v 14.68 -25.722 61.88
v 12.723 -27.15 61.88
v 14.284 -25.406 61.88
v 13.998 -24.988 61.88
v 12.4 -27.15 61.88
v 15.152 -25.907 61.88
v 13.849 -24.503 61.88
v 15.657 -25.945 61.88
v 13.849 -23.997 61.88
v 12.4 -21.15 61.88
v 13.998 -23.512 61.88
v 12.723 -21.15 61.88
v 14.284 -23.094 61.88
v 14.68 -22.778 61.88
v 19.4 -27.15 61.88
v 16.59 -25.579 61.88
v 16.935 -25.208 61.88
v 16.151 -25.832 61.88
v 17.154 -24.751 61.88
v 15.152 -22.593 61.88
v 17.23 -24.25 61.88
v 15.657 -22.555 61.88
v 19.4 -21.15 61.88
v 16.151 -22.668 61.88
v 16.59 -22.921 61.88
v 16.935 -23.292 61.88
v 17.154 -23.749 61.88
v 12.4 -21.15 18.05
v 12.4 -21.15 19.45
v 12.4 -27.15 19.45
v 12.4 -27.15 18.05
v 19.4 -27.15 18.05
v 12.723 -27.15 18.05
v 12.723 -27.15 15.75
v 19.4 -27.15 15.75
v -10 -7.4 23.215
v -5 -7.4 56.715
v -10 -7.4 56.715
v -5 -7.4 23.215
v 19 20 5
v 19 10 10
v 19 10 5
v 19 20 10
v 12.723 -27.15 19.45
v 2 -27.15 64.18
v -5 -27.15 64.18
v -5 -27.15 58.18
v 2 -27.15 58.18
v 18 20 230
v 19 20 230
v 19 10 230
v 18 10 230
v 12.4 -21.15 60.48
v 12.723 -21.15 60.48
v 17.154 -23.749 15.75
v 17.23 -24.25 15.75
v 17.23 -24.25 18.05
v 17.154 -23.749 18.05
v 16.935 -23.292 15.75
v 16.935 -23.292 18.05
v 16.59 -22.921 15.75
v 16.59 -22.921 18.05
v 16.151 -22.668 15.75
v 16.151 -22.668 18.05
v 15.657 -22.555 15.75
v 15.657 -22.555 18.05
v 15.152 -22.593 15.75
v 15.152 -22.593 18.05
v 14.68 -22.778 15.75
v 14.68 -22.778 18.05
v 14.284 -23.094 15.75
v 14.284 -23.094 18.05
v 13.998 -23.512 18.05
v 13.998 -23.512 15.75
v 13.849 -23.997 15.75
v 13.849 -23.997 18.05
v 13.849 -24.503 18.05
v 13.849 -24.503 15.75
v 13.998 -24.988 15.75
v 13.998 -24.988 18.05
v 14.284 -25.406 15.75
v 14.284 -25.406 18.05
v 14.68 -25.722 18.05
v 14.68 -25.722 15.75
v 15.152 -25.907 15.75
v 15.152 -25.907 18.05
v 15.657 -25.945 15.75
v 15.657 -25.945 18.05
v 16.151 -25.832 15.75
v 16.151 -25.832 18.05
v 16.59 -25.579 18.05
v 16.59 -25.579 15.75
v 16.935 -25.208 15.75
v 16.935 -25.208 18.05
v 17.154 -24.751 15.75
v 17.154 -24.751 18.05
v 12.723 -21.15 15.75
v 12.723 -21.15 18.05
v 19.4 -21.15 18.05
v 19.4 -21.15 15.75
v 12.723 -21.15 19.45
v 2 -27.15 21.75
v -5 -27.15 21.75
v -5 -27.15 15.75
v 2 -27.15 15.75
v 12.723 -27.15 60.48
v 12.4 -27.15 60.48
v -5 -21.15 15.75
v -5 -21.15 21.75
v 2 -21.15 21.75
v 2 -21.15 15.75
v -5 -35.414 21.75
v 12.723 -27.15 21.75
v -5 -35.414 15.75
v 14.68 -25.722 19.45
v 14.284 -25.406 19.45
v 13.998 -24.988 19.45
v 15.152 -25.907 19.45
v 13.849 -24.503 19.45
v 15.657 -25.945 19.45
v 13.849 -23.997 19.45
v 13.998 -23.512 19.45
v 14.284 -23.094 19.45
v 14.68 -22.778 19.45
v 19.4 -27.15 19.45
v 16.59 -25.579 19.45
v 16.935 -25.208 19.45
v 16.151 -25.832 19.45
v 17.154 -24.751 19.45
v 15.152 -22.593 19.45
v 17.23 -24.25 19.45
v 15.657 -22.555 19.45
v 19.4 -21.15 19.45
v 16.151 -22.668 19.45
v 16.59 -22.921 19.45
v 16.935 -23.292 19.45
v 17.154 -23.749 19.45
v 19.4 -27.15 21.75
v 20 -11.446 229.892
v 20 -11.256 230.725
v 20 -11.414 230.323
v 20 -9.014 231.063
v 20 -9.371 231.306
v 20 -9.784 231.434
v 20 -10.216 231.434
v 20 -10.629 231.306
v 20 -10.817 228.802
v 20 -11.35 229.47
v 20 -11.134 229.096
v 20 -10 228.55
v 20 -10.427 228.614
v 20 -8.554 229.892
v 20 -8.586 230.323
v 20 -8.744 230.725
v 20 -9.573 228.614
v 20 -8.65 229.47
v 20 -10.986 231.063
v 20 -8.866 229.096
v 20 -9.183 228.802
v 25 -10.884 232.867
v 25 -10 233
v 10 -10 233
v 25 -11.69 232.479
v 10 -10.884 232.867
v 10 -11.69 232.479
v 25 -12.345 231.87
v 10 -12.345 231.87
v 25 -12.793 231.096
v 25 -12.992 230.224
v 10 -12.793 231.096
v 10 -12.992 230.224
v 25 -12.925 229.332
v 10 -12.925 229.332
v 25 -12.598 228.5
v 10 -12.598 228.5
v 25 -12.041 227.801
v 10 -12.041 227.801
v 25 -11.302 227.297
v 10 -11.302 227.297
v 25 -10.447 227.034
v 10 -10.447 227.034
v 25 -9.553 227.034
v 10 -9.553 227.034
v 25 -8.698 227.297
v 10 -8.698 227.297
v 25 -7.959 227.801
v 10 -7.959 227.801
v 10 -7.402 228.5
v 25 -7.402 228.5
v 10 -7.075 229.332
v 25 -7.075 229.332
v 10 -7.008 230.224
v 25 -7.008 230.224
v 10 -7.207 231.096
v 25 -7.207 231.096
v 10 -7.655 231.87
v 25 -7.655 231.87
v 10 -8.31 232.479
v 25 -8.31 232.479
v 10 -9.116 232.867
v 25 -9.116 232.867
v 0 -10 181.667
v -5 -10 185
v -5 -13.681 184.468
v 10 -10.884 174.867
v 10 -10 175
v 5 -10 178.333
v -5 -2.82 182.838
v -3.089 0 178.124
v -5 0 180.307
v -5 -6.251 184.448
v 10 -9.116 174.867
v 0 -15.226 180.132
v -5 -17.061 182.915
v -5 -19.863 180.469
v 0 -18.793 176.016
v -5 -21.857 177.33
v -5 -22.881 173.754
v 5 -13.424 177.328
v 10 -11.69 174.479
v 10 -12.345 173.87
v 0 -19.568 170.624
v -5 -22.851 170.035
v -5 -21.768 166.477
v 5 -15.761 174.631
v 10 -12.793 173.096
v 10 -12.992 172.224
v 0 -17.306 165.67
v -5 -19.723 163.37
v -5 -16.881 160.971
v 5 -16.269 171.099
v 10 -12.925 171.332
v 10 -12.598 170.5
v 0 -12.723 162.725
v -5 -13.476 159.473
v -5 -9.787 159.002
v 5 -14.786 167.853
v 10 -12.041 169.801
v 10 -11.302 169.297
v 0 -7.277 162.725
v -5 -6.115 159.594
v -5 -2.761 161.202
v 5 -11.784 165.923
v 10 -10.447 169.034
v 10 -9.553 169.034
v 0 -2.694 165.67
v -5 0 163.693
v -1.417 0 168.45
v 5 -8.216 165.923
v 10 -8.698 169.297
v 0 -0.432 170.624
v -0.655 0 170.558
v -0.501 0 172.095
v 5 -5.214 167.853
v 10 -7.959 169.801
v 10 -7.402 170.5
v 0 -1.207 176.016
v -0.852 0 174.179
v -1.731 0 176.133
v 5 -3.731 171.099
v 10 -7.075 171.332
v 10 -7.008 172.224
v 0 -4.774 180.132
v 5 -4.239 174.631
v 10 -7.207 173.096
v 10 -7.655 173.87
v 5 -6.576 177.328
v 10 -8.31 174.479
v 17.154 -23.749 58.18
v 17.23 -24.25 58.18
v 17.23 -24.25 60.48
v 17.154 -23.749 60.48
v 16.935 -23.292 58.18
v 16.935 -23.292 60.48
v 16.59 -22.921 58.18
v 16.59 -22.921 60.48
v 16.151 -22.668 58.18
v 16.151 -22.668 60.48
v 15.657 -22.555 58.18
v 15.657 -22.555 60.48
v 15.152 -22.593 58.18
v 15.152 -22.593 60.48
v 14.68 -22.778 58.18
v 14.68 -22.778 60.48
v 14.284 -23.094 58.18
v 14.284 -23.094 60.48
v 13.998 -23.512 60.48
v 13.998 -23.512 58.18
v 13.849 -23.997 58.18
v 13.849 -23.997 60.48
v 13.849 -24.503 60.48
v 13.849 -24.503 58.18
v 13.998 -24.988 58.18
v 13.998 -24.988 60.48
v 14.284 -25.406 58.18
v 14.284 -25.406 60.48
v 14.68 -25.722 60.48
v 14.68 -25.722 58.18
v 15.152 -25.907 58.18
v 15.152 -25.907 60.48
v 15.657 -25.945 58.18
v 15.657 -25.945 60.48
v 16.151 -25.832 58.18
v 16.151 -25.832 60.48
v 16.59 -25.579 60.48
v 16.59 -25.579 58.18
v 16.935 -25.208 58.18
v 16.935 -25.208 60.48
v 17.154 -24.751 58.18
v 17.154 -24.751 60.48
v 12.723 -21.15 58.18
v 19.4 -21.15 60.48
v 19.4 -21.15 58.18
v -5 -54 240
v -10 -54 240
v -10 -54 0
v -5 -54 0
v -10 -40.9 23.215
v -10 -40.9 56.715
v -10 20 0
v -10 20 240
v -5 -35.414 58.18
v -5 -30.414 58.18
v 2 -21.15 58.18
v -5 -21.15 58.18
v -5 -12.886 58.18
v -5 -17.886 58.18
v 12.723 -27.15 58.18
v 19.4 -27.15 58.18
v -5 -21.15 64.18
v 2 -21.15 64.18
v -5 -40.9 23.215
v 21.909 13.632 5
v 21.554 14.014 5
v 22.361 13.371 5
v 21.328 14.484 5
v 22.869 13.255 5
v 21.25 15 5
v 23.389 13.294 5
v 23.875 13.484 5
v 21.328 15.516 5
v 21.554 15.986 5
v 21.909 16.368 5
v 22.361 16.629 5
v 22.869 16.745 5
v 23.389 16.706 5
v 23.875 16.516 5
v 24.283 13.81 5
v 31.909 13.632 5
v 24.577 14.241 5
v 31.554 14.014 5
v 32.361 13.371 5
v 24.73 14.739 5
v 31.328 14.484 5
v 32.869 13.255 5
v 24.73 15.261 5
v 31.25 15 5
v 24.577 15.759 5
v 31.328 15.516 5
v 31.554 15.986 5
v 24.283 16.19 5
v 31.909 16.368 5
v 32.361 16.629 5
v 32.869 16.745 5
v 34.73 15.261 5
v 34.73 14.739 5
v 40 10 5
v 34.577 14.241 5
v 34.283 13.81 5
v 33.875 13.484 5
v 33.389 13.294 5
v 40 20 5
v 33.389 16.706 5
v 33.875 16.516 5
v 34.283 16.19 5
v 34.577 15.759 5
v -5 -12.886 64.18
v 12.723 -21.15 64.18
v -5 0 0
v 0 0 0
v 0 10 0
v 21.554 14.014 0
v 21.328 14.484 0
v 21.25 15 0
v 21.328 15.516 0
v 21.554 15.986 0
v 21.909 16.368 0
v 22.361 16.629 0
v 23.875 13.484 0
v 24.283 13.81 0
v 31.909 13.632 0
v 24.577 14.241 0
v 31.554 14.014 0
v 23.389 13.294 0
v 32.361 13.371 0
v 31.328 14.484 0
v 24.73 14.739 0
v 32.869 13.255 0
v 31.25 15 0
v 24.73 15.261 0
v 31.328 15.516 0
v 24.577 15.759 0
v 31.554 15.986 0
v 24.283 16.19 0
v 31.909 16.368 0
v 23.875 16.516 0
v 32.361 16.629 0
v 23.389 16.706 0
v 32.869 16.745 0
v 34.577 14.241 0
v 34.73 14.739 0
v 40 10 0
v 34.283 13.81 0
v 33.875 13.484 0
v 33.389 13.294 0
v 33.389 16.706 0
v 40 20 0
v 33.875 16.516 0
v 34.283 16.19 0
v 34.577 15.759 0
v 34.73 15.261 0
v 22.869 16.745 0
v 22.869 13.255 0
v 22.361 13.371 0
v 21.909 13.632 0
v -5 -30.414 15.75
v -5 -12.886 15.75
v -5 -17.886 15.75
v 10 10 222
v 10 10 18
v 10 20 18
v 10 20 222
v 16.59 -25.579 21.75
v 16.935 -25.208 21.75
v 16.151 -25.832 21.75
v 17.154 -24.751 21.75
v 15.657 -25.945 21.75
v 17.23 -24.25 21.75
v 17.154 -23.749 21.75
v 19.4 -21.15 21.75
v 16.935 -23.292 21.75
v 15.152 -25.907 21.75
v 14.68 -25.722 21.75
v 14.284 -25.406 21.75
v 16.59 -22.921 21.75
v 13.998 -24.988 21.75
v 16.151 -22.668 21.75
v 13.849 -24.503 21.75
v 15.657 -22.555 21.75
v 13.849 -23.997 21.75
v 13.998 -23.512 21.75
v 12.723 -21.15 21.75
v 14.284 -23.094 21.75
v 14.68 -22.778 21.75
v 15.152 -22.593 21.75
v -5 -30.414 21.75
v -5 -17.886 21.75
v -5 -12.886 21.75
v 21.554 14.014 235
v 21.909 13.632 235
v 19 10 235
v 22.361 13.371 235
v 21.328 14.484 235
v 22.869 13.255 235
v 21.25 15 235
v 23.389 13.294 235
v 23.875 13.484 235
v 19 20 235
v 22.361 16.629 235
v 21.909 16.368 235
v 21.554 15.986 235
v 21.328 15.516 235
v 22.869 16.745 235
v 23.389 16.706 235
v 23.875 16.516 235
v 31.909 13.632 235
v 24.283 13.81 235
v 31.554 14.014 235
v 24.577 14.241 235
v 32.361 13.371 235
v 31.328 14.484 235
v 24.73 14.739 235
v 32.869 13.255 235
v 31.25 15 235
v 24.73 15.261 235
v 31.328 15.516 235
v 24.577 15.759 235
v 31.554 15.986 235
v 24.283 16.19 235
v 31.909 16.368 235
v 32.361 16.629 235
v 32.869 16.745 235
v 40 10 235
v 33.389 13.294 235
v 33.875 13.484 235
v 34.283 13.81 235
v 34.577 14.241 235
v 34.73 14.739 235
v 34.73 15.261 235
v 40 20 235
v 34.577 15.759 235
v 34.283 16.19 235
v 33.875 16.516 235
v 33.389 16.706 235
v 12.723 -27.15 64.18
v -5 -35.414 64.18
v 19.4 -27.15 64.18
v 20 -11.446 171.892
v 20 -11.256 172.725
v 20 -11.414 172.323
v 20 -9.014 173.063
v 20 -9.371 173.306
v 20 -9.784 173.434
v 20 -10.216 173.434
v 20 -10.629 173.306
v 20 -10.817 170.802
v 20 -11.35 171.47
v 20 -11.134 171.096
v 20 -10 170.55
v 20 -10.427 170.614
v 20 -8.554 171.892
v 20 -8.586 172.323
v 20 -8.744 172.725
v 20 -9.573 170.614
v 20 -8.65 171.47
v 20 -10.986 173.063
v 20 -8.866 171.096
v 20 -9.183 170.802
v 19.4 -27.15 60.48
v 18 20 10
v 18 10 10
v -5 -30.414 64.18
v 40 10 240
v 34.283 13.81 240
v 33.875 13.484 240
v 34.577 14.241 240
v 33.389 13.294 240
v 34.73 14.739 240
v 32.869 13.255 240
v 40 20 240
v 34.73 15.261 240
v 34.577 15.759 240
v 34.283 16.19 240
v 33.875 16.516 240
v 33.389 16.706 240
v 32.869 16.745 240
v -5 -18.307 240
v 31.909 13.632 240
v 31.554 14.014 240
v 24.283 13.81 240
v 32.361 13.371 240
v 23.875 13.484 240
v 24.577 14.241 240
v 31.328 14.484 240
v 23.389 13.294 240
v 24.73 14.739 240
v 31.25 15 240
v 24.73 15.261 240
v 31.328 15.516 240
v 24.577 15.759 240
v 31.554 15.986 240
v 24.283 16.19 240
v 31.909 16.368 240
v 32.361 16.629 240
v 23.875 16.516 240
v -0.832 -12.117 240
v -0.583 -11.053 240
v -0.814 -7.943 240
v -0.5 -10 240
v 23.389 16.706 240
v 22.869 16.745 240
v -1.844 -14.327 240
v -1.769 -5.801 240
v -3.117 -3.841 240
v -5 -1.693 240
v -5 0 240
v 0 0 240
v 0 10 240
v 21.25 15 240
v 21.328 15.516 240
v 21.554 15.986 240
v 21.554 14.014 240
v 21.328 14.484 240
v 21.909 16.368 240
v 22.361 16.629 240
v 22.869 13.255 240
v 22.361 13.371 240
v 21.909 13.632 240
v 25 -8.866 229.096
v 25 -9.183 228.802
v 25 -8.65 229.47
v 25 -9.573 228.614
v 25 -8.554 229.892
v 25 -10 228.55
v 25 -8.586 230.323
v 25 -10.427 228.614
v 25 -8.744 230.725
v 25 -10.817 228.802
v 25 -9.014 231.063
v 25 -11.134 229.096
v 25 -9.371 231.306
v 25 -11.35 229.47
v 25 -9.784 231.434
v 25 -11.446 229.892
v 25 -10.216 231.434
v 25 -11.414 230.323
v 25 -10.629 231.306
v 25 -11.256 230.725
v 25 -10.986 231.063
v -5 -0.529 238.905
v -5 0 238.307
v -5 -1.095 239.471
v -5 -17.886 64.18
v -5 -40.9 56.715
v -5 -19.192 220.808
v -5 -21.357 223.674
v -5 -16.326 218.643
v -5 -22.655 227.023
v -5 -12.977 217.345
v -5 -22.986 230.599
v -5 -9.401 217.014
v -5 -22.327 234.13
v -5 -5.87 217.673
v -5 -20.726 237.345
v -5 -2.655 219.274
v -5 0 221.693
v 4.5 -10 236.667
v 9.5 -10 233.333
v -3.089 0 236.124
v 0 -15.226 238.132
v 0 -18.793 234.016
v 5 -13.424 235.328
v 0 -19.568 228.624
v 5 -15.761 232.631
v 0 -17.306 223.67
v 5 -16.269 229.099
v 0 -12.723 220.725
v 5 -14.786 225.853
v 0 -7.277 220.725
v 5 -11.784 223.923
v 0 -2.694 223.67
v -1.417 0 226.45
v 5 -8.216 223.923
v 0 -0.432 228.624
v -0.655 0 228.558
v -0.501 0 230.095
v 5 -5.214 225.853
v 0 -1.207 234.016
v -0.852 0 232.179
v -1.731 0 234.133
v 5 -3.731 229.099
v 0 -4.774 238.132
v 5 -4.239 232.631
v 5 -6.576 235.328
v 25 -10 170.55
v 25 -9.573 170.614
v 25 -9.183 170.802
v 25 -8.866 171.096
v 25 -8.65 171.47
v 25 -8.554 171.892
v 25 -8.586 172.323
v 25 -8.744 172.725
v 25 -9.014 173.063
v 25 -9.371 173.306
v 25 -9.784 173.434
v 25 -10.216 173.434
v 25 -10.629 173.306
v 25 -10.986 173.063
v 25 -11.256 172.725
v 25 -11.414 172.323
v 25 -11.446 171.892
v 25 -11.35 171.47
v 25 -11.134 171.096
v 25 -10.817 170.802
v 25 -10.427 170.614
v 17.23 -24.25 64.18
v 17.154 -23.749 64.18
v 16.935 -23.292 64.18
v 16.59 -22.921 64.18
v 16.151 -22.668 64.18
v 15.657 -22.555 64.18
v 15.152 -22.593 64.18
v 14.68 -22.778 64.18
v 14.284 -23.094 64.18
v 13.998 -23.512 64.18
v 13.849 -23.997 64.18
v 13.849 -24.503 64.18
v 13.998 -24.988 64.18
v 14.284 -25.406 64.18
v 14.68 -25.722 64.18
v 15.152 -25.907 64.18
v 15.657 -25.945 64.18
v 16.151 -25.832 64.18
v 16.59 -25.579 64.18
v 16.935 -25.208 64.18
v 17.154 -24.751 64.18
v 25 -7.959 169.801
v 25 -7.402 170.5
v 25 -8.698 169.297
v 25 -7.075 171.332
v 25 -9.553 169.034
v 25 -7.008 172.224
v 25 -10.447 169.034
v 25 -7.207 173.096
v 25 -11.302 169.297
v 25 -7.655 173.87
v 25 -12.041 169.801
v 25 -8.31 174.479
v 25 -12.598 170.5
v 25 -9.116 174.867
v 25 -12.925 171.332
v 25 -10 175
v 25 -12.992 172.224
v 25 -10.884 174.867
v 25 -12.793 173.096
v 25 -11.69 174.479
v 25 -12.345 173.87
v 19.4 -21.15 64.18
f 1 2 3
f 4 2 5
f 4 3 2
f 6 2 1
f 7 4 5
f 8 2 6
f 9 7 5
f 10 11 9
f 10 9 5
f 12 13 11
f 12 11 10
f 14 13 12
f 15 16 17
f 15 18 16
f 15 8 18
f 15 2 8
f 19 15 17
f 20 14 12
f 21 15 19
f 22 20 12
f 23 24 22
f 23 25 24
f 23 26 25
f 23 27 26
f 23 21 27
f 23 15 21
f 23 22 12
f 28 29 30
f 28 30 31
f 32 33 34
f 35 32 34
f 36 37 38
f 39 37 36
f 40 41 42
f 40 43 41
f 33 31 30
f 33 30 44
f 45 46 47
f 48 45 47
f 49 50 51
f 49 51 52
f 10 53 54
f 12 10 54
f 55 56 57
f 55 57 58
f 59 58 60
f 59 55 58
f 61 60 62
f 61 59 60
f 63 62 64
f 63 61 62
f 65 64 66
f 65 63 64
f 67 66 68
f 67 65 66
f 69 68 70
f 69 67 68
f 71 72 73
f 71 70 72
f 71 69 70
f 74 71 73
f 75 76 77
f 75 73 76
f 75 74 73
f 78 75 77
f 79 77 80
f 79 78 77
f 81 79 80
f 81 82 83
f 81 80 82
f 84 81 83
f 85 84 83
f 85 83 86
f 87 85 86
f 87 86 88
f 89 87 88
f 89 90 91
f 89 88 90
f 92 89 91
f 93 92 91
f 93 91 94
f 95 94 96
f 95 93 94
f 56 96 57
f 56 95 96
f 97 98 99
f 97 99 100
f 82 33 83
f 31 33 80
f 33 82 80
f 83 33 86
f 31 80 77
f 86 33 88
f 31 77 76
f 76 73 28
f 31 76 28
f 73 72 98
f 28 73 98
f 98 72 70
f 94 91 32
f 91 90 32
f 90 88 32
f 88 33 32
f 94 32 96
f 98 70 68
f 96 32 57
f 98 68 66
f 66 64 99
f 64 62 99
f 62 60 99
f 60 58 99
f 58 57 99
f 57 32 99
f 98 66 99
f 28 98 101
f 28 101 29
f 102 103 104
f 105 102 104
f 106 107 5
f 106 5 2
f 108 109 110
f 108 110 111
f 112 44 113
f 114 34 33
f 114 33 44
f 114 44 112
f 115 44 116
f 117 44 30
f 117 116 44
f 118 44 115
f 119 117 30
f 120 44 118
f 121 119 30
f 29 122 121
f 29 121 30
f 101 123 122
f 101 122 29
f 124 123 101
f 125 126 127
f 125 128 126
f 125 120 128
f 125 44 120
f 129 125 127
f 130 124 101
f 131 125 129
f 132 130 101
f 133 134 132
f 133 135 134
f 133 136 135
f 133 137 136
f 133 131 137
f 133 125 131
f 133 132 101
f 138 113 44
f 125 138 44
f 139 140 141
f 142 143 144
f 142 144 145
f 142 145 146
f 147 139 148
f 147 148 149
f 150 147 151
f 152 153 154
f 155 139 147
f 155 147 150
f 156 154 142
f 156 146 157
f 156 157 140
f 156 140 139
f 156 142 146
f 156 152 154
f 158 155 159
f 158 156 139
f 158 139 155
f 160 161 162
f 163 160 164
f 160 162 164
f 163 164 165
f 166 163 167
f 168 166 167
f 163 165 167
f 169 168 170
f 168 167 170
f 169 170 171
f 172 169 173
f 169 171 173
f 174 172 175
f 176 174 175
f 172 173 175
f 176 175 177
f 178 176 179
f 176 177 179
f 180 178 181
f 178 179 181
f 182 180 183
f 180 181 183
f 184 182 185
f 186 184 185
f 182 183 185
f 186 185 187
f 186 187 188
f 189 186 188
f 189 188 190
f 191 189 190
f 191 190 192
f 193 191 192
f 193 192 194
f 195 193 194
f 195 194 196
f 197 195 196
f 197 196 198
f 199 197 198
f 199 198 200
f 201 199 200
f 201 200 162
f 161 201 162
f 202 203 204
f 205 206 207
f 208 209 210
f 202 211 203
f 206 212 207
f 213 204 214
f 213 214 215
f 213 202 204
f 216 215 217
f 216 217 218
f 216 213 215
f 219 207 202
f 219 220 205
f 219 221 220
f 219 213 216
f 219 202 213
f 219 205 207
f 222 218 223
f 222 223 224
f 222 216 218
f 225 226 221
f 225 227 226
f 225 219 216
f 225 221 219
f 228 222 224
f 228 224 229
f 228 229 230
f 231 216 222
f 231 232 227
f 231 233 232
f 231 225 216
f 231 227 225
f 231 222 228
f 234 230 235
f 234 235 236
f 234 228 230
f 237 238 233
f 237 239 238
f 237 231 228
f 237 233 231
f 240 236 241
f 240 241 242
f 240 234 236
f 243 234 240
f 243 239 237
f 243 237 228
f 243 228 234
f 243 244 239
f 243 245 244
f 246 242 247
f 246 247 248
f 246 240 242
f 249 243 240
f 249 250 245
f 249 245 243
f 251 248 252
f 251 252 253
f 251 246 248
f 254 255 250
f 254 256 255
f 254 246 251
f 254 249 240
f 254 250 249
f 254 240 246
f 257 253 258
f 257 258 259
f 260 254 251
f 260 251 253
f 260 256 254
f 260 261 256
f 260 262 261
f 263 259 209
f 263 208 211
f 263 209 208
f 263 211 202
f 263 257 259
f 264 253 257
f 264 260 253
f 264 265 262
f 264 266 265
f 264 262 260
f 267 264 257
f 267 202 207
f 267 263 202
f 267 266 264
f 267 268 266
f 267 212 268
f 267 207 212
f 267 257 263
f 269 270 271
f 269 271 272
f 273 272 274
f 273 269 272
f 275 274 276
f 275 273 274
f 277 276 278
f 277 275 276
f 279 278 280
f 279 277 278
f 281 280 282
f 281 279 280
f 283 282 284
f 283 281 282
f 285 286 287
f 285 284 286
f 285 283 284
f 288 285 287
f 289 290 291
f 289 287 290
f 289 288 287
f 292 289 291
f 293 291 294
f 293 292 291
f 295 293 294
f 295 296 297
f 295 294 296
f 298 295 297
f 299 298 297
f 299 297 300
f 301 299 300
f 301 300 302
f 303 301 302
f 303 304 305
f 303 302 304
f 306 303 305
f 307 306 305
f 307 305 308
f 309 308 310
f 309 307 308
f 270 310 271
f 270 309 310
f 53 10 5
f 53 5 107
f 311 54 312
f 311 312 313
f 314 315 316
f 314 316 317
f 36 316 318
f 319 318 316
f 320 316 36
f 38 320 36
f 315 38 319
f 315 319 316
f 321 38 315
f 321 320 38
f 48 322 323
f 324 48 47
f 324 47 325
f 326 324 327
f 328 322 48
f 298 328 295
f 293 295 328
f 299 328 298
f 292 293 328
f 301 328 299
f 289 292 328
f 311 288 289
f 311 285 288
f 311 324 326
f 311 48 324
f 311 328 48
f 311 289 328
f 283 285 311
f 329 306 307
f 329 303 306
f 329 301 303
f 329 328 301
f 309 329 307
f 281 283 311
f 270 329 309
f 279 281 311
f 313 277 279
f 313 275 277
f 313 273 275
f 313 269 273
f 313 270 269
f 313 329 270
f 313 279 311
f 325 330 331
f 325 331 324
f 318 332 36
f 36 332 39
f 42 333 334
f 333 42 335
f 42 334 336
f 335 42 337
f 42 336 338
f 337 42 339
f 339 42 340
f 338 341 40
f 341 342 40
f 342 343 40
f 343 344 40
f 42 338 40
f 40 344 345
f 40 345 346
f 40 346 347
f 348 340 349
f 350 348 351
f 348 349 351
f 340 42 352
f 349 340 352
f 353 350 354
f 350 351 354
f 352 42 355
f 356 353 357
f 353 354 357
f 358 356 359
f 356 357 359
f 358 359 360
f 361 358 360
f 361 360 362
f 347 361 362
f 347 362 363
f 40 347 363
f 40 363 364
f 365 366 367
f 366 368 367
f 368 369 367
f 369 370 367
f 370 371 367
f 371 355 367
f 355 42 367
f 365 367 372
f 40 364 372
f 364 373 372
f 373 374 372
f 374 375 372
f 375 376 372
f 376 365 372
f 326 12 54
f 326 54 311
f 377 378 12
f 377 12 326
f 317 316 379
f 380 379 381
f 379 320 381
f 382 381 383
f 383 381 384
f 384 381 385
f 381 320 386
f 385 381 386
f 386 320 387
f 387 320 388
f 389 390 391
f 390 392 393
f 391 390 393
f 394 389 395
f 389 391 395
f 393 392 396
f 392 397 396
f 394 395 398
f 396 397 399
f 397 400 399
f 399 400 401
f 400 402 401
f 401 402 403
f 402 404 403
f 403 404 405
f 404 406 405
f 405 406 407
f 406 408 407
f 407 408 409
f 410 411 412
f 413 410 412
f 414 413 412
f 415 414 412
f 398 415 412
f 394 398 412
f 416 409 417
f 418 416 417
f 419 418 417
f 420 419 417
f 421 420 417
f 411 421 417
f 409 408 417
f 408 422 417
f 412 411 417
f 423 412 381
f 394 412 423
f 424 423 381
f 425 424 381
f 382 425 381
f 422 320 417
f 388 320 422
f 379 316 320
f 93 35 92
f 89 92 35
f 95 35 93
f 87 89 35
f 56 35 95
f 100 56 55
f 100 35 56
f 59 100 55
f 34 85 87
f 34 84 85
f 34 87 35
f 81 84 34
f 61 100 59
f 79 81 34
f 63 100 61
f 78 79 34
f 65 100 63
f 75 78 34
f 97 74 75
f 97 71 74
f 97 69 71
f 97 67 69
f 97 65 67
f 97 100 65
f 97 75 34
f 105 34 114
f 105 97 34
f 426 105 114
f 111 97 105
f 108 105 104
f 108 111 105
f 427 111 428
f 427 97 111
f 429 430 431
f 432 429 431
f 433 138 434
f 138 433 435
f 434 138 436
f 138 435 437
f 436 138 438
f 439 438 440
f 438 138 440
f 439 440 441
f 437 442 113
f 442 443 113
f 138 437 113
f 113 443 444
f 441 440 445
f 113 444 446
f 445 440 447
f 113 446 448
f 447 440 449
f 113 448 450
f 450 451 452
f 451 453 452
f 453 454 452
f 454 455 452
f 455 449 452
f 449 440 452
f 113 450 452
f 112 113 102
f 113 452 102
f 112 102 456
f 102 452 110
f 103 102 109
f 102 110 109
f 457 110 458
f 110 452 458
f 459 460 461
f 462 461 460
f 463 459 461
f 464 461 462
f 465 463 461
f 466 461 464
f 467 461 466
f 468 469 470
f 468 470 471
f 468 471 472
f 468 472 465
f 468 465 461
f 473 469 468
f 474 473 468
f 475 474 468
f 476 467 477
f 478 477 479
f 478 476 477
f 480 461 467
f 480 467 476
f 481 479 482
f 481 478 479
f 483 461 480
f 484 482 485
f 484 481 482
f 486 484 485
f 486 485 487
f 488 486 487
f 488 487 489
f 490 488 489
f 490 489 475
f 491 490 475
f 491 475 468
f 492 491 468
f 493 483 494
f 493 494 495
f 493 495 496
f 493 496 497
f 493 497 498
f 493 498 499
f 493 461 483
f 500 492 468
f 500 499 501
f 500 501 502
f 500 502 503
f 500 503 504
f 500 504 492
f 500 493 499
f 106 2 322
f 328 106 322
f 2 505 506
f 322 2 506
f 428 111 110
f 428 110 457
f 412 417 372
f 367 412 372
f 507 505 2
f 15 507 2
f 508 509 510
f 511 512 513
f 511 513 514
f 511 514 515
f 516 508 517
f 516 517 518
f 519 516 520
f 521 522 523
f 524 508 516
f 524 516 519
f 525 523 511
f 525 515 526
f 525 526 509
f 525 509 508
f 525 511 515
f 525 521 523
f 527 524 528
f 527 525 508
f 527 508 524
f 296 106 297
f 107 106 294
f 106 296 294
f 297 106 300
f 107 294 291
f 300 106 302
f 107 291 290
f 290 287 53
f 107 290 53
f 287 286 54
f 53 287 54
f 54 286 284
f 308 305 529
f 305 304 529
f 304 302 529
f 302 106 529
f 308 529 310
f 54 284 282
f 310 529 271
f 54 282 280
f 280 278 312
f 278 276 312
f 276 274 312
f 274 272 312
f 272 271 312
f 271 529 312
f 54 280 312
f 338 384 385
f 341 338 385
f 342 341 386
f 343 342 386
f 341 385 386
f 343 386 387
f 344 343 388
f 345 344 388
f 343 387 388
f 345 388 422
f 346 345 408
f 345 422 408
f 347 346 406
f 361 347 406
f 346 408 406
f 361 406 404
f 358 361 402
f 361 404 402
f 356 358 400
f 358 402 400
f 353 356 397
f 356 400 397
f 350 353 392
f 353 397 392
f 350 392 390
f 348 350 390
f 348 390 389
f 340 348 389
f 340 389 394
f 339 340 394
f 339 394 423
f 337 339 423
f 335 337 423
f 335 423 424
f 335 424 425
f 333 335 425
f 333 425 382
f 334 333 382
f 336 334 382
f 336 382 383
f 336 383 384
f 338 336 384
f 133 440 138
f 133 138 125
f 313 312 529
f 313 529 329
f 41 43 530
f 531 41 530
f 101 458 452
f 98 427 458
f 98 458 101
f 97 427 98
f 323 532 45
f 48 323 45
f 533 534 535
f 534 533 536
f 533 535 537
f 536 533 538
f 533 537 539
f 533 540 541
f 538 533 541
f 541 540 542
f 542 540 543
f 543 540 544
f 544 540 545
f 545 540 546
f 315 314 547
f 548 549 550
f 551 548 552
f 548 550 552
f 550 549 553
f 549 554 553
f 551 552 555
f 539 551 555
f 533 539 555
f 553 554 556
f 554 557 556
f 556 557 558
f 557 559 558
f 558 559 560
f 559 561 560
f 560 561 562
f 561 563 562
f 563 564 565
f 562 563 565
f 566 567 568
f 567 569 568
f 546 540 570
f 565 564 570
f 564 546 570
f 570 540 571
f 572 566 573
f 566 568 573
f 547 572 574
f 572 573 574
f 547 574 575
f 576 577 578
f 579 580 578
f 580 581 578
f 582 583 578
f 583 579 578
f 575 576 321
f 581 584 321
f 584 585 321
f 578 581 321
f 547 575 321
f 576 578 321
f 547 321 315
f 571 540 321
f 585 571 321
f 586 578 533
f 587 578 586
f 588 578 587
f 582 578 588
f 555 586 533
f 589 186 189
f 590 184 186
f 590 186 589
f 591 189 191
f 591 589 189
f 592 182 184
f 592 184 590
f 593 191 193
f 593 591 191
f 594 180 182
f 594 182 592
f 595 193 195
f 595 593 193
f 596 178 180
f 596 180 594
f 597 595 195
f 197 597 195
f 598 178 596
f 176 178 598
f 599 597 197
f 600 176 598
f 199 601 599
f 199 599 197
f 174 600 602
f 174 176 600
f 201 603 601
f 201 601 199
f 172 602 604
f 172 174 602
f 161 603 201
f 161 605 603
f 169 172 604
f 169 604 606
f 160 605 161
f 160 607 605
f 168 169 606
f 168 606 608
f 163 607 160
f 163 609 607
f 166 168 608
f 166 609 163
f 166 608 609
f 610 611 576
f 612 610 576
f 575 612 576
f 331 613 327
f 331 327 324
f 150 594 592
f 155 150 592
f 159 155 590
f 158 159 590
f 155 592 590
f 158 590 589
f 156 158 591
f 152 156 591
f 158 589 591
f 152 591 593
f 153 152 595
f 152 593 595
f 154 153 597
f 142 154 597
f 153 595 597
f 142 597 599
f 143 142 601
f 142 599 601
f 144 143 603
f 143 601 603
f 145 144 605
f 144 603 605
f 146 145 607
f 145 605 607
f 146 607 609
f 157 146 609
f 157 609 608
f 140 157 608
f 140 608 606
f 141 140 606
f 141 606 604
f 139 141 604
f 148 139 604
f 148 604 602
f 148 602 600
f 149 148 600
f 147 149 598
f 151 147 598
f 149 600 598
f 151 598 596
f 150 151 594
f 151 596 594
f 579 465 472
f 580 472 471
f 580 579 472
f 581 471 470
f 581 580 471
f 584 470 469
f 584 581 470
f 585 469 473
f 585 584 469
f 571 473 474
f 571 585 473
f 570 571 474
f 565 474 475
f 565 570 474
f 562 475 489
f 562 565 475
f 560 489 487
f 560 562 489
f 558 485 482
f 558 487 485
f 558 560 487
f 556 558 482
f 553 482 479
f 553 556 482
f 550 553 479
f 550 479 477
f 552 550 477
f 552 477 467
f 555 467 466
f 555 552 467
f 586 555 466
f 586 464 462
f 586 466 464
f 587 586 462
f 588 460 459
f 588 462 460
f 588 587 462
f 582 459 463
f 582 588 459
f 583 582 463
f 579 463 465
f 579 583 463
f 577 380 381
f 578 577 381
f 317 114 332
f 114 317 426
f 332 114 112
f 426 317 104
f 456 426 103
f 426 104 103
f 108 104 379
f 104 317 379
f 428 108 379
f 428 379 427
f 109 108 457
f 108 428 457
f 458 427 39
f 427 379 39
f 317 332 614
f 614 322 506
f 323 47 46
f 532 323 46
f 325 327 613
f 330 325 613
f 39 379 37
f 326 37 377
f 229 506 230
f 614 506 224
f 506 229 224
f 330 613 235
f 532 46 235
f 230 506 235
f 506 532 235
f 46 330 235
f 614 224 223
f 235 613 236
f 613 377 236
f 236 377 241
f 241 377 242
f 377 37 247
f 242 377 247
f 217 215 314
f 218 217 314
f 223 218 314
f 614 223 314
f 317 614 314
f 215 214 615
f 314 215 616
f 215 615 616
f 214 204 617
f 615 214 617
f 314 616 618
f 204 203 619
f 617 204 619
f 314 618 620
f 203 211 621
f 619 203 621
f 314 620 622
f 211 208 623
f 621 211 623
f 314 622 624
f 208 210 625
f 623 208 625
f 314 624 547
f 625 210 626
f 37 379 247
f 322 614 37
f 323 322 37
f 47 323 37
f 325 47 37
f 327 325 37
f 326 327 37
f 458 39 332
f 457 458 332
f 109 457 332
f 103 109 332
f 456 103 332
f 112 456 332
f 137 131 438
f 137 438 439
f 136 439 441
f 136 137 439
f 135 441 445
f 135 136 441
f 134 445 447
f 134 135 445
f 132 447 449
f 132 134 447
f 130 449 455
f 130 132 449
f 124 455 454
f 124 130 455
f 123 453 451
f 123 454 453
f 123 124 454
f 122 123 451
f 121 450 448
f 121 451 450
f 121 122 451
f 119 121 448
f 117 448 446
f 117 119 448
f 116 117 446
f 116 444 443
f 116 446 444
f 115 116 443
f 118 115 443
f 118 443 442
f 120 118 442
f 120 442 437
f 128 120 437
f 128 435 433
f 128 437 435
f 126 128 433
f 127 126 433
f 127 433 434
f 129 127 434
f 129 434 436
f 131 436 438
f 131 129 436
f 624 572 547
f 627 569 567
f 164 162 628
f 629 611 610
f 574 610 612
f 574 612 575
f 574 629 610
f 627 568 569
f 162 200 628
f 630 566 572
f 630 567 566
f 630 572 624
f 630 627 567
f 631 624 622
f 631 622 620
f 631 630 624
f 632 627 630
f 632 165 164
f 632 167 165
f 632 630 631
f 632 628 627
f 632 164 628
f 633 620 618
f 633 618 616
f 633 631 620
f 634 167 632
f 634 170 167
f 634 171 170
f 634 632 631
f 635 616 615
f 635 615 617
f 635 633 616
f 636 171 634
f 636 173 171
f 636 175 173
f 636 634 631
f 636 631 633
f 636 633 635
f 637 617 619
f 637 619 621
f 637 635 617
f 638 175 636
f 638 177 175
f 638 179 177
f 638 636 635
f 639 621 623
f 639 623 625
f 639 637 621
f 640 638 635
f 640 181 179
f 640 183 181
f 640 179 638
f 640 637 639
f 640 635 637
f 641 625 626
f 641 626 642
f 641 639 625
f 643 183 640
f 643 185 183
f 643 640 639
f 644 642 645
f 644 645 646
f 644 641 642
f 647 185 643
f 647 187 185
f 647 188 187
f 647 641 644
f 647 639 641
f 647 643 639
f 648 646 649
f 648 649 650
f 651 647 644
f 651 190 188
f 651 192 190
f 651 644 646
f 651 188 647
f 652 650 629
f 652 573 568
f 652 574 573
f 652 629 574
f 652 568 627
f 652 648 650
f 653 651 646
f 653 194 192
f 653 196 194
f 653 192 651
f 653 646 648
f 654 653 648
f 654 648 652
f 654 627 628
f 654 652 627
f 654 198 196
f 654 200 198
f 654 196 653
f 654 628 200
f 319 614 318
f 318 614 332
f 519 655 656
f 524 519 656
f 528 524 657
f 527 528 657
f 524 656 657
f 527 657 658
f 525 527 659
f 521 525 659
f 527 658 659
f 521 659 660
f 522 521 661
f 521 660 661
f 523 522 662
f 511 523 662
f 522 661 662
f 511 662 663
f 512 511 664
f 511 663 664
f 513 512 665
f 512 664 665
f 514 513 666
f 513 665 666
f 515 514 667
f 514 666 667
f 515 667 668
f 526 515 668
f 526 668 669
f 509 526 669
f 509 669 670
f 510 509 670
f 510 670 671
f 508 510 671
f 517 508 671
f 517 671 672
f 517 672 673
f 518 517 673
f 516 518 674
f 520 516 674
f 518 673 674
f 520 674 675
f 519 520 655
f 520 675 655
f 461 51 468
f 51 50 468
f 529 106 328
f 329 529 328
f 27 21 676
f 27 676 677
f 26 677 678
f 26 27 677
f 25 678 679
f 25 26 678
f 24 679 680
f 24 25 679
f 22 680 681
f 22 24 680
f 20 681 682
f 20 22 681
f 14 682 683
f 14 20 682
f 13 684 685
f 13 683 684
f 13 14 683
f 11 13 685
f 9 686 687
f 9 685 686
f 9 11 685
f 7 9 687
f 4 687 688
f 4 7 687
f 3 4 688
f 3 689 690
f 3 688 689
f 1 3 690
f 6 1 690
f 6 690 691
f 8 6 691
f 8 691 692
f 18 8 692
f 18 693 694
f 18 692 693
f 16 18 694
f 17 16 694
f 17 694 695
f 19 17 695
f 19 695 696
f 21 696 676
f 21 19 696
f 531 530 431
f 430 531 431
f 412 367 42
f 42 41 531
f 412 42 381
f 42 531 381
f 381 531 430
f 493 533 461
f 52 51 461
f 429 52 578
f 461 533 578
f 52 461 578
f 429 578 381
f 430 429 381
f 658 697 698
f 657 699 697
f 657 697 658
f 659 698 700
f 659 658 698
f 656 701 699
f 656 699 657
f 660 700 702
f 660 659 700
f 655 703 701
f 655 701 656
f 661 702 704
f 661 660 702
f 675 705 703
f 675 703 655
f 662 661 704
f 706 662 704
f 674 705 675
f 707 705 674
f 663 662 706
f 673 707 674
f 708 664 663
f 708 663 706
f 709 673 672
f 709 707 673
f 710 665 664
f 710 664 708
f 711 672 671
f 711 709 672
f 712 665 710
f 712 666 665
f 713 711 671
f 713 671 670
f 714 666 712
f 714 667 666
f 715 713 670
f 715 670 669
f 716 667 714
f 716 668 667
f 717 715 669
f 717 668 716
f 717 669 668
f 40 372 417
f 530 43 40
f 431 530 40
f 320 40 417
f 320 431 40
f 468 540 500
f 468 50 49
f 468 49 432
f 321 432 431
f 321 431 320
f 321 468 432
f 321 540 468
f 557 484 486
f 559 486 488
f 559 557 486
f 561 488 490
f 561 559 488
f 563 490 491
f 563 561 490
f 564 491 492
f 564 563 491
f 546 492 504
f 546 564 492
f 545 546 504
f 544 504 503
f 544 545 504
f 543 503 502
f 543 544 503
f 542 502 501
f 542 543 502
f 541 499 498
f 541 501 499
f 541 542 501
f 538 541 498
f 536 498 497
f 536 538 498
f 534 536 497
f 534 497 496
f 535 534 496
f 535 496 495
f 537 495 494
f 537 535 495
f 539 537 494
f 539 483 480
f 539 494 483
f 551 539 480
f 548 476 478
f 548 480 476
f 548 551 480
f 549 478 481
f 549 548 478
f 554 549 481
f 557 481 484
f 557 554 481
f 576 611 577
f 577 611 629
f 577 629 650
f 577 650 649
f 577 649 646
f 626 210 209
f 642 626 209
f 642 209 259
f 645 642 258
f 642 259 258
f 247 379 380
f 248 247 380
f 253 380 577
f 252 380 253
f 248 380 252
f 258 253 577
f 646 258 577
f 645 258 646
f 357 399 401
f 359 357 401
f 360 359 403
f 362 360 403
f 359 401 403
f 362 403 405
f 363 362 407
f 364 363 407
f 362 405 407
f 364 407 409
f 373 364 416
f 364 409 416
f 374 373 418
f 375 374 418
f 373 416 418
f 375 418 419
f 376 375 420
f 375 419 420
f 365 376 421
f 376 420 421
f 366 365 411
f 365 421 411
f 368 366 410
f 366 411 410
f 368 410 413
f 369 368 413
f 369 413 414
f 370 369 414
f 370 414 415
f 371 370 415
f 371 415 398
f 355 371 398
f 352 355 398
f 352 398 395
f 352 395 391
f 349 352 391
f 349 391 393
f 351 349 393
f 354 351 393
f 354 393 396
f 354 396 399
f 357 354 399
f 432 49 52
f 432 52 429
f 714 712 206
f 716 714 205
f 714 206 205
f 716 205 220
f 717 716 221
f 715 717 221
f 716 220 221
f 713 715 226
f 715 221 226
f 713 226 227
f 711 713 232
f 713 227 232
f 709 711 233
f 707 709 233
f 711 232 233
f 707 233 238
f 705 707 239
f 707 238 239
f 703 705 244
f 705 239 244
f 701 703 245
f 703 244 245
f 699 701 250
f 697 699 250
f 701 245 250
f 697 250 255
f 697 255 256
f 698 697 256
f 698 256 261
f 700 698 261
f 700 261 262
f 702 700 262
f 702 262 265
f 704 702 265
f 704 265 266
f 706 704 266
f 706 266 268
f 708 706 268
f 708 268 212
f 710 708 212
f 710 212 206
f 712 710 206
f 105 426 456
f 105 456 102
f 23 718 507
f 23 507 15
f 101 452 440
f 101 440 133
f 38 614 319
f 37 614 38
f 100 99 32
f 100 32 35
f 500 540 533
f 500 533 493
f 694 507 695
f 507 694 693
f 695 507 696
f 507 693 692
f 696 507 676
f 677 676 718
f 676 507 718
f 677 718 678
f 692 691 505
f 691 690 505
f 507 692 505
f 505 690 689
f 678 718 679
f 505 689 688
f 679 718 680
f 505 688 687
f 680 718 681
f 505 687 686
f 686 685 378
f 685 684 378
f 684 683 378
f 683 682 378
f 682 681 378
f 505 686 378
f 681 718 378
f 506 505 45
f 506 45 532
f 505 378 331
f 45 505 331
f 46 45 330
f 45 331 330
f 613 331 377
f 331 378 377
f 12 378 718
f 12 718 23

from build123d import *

# Parameters (mm, degrees)
BOSS_EXTRUDE1_DEPTH     = 240
BOSS_EXTRUDE3_DEPTH     = 10
SKETCH5_R               = 1.75
CUT_EXTRUDE1_DEPTH      = 245.131112315
SKETCH6_W               = 7
SKETCH6_H               = 12
CUT_EXTRUDE2_DEPTH      = 21
SKETCH7_W               = 5
SKETCH7_H               = 240
BOSS_EXTRUDE4_DEPTH     = 54
SKETCH8_W               = 6
SKETCH8_H               = 6
BOSS_EXTRUDE5_DEPTH     = 24.4
CUT_EXTRUDE3_DEPTH      = 229.361692278
CUT_EXTRUDE3_DEPTH_BACK = 229.361692278
SKETCH9_R               = 1.7
SKETCH10_W              = 1.4
SKETCH10_H              = 6
CUT_EXTRUDE4_DEPTH      = 7
BOSS_EXTRUDE6_REACH     = 190.225
BOSS_EXTRUDE7_DEPTH     = 6
SKETCH13_R              = 3
BOSS_EXTRUDE8_DEPTH     = 30
SKETCH15_R              = 1.45
CUT_EXTRUDE5_DEPTH      = 5
SKETCH16_W              = 33.5
SKETCH16_H              = 33.5
CUT_EXTRUDE6_DEPTH      = 5
CHAMFER1_SIZE           = 10
CHAMFER1_SIZE_2         = 15


with BuildPart() as part:
    # Sketch1 → Boss-Extrude1 (new body)
    with BuildSketch(Plane.XY):
        Polygon((-10, 0), (0, 0), (0, 10), (10, 10), (10, 20), (-10, 20), align=None)
    extrude(amount=BOSS_EXTRUDE1_DEPTH)

    # Sketch4 → Boss-Extrude3 (add)
    with BuildSketch(Plane(origin=(0, 20, 0), x_dir=(1, 0, 0), z_dir=(0, 1, 0))):
        Polygon((10, 0), (40, 0), (40, -10), (18, -10), (10, -18), align=None)
    boss_extrude3 = extrude(amount=-BOSS_EXTRUDE3_DEPTH)

    # Sketch5 → Cut-Extrude1 (cut, through all)
    with BuildSketch(Plane(origin=(0, 0, 0), x_dir=(-1, 0, 0), z_dir=(0, 0, -1))):
        with Locations((-33, 15)):
            Circle(SKETCH5_R)
        with Locations((-23, 15)):
            Circle(SKETCH5_R)
    cut_extrude1 = extrude(amount=-CUT_EXTRUDE1_DEPTH, mode=Mode.SUBTRACT)

    # Sketch6 → Cut-Extrude2 (cut)
    with BuildSketch(Plane(origin=(40, 0, 0), x_dir=(0, 0, -1), z_dir=(1, 0, 0))):
        with Locations((-8.5, 15)):
            Rectangle(SKETCH6_W, SKETCH6_H)
    cut_extrude2 = extrude(amount=-CUT_EXTRUDE2_DEPTH, mode=Mode.SUBTRACT)

    # Mirror1: Boss-Extrude3, Cut-Extrude1, Cut-Extrude2 across plane
    add(boss_extrude3.mirror(Plane(origin=(0, 0, 120), x_dir=(1, 0, 0), z_dir=(0, 0, -1))))
    add(cut_extrude1.mirror(Plane(origin=(0, 0, 120), x_dir=(1, 0, 0), z_dir=(0, 0, -1))), mode=Mode.SUBTRACT)
    add(cut_extrude2.mirror(Plane(origin=(0, 0, 120), x_dir=(1, 0, 0), z_dir=(0, 0, -1))), mode=Mode.SUBTRACT)

    # Sketch7 → Boss-Extrude4 (add)
    with BuildSketch(Plane.XZ):
        with Locations((-7.5, 120)):
            Rectangle(SKETCH7_W, SKETCH7_H)
    extrude(amount=BOSS_EXTRUDE4_DEPTH)

    # Sketch8 → Boss-Extrude5 (add)
    with BuildSketch(Plane(origin=(-5, 0, 0), x_dir=(0, 0, -1), z_dir=(1, 0, 0))):
        with Locations((-18.75, -24.15)):
            Rectangle(SKETCH8_W, SKETCH8_H)
        with Locations((-61.18, -24.15)):
            Rectangle(SKETCH8_W, SKETCH8_H)
    extrude(amount=BOSS_EXTRUDE5_DEPTH)

    # Sketch9 → Cut-Extrude3 (cut, two sides: drawn at the far end of the back side and taken through both)
    with BuildSketch(Plane.XY.offset(21.75).offset(-CUT_EXTRUDE3_DEPTH_BACK)):
        with Locations((15.53, -24.25)):
            Circle(SKETCH9_R)
    extrude(amount=CUT_EXTRUDE3_DEPTH + CUT_EXTRUDE3_DEPTH_BACK, mode=Mode.SUBTRACT)

    # Sketch10 → Cut-Extrude4 (cut)
    with BuildSketch(Plane(origin=(19.4, 0, 0), x_dir=(0, 0, -1), z_dir=(1, 0, 0))):
        with Locations((-18.75, -24.15)):
            Rectangle(SKETCH10_W, SKETCH10_H)
        with Locations((-61.18, -24.15)):
            Rectangle(SKETCH10_W, SKETCH10_H)
    extrude(amount=-CUT_EXTRUDE4_DEPTH, mode=Mode.SUBTRACT)

    # Boss-Extrude6: up to this face of the body (flat: up to its plane)
    boss_extrude6_end = Plane(part.part.faces().sort_by_distance((6.649247597, -24.143388326, 58.18))[0])
    # Sketch11 → Boss-Extrude6 (add, up to the picked face)
    with BuildSketch(Plane.XY.offset(64.18), mode=Mode.PRIVATE) as boss_extrude6_sk1:
        Polygon((12.722534603, -21.15), (-5, -12.885846393), (-5, -17.885846393), (2, -21.15), align=None)
    boss_extrude6_tool1 = split(extrude(boss_extrude6_sk1.sketch, amount=-BOSS_EXTRUDE6_REACH, mode=Mode.PRIVATE), bisect_by=boss_extrude6_end, keep=Keep.BOTH, mode=Mode.PRIVATE)
    # Sketch11 → Boss-Extrude6 (add, up to the picked face)
    with BuildSketch(Plane.XY.offset(64.18), mode=Mode.PRIVATE) as boss_extrude6_sk2:
        Polygon((-5, -30.414153607), (2, -27.15), (12.722534603, -27.15), (-5, -35.414153607), align=None)
    boss_extrude6_tool2 = split(extrude(boss_extrude6_sk2.sketch, amount=-BOSS_EXTRUDE6_REACH, mode=Mode.PRIVATE), bisect_by=boss_extrude6_end, keep=Keep.BOTH, mode=Mode.PRIVATE)
    add(boss_extrude6_tool1.solids().sort_by(Axis((1.568177, -18.087209, 64.18), (0, 0, -1)))[0])
    add(boss_extrude6_tool2.solids().sort_by(Axis((1.568177, -30.212791, 64.18), (0, 0, -1)))[0])

    # Sketch12 → Boss-Extrude7 (add)
    with BuildSketch(Plane(origin=(0, 0, 15.75), x_dir=(-1, 0, 0), z_dir=(0, 0, -1))):
        Polygon((-12.722534603, -21.15), (-2, -21.15), (5, -17.885846393), (5, -12.885846393), align=None)
        Polygon((-2, -27.15), (-12.722534603, -27.15), (5, -35.414153607), (5, -30.414153607), align=None)
    extrude(amount=-BOSS_EXTRUDE7_DEPTH)

    # Sketch13 → Boss-Extrude8 (add)
    with BuildSketch(Plane(origin=(-5, 0, 0), x_dir=(0, 0, -1), z_dir=(1, 0, 0))):
        with Locations(Location((-230, -10, 0), (0, 0, 180))):
            Circle(SKETCH13_R)
        with Locations(Location((-172, -10, 0), (0, 0, 180))):
            Circle(SKETCH13_R)
    extrude(amount=BOSS_EXTRUDE8_DEPTH)

    # Sketch15 → Cut-Extrude5 (cut)
    with BuildSketch(Plane(origin=(25, 0, 0), x_dir=(0, 0, -1), z_dir=(1, 0, 0))):
        with Locations((-230, -10)):
            Circle(SKETCH15_R)
        with Locations((-172, -10)):
            Circle(SKETCH15_R)
    extrude(amount=-CUT_EXTRUDE5_DEPTH, mode=Mode.SUBTRACT)

    # Sketch16 → Cut-Extrude6 (cut)
    with BuildSketch(Plane(origin=(-5, 0, 0), x_dir=(0, 0, -1), z_dir=(1, 0, 0))):
        with Locations((-39.965, -24.15)):
            Rectangle(SKETCH16_W, SKETCH16_H)
    extrude(amount=-CUT_EXTRUDE6_DEPTH, mode=Mode.SUBTRACT)

    # Chamfer1
    # the kernel refuses this chamfer: 15, 10 mm, written as the material it adds along each edge
    with BuildSketch(Plane(origin=(-5, -10, 172), x_dir=(0, 0, 1), z_dir=(0, 1, 0))) as chamfer1_piece_1:
        Polygon((3 + CHAMFER1_SIZE, 0), (3, CHAMFER1_SIZE_2), (3, 0), align=None)
    revolve(axis=Axis((-5, -10, 172), (1, 0, 0)))
    with BuildSketch(Plane(origin=(-5, -10, 230), x_dir=(0, 0, 1), z_dir=(0, 1, 0))) as chamfer1_piece_2_section:
        Polygon((3 + CHAMFER1_SIZE, 0), (3, CHAMFER1_SIZE_2), (3, 0), align=None)
    chamfer1_piece_2 = revolve(axis=Axis((-5, -10, 230), (1, 0, 0)), mode=Mode.PRIVATE)
    chamfer1_piece_2 = split(chamfer1_piece_2, bisect_by=Plane(origin=(2.41807783, -10, 240), z_dir=(0, 0, -1)), keep=Keep.TOP, mode=Mode.PRIVATE)
    add(chamfer1_piece_2)


solid = part.part
